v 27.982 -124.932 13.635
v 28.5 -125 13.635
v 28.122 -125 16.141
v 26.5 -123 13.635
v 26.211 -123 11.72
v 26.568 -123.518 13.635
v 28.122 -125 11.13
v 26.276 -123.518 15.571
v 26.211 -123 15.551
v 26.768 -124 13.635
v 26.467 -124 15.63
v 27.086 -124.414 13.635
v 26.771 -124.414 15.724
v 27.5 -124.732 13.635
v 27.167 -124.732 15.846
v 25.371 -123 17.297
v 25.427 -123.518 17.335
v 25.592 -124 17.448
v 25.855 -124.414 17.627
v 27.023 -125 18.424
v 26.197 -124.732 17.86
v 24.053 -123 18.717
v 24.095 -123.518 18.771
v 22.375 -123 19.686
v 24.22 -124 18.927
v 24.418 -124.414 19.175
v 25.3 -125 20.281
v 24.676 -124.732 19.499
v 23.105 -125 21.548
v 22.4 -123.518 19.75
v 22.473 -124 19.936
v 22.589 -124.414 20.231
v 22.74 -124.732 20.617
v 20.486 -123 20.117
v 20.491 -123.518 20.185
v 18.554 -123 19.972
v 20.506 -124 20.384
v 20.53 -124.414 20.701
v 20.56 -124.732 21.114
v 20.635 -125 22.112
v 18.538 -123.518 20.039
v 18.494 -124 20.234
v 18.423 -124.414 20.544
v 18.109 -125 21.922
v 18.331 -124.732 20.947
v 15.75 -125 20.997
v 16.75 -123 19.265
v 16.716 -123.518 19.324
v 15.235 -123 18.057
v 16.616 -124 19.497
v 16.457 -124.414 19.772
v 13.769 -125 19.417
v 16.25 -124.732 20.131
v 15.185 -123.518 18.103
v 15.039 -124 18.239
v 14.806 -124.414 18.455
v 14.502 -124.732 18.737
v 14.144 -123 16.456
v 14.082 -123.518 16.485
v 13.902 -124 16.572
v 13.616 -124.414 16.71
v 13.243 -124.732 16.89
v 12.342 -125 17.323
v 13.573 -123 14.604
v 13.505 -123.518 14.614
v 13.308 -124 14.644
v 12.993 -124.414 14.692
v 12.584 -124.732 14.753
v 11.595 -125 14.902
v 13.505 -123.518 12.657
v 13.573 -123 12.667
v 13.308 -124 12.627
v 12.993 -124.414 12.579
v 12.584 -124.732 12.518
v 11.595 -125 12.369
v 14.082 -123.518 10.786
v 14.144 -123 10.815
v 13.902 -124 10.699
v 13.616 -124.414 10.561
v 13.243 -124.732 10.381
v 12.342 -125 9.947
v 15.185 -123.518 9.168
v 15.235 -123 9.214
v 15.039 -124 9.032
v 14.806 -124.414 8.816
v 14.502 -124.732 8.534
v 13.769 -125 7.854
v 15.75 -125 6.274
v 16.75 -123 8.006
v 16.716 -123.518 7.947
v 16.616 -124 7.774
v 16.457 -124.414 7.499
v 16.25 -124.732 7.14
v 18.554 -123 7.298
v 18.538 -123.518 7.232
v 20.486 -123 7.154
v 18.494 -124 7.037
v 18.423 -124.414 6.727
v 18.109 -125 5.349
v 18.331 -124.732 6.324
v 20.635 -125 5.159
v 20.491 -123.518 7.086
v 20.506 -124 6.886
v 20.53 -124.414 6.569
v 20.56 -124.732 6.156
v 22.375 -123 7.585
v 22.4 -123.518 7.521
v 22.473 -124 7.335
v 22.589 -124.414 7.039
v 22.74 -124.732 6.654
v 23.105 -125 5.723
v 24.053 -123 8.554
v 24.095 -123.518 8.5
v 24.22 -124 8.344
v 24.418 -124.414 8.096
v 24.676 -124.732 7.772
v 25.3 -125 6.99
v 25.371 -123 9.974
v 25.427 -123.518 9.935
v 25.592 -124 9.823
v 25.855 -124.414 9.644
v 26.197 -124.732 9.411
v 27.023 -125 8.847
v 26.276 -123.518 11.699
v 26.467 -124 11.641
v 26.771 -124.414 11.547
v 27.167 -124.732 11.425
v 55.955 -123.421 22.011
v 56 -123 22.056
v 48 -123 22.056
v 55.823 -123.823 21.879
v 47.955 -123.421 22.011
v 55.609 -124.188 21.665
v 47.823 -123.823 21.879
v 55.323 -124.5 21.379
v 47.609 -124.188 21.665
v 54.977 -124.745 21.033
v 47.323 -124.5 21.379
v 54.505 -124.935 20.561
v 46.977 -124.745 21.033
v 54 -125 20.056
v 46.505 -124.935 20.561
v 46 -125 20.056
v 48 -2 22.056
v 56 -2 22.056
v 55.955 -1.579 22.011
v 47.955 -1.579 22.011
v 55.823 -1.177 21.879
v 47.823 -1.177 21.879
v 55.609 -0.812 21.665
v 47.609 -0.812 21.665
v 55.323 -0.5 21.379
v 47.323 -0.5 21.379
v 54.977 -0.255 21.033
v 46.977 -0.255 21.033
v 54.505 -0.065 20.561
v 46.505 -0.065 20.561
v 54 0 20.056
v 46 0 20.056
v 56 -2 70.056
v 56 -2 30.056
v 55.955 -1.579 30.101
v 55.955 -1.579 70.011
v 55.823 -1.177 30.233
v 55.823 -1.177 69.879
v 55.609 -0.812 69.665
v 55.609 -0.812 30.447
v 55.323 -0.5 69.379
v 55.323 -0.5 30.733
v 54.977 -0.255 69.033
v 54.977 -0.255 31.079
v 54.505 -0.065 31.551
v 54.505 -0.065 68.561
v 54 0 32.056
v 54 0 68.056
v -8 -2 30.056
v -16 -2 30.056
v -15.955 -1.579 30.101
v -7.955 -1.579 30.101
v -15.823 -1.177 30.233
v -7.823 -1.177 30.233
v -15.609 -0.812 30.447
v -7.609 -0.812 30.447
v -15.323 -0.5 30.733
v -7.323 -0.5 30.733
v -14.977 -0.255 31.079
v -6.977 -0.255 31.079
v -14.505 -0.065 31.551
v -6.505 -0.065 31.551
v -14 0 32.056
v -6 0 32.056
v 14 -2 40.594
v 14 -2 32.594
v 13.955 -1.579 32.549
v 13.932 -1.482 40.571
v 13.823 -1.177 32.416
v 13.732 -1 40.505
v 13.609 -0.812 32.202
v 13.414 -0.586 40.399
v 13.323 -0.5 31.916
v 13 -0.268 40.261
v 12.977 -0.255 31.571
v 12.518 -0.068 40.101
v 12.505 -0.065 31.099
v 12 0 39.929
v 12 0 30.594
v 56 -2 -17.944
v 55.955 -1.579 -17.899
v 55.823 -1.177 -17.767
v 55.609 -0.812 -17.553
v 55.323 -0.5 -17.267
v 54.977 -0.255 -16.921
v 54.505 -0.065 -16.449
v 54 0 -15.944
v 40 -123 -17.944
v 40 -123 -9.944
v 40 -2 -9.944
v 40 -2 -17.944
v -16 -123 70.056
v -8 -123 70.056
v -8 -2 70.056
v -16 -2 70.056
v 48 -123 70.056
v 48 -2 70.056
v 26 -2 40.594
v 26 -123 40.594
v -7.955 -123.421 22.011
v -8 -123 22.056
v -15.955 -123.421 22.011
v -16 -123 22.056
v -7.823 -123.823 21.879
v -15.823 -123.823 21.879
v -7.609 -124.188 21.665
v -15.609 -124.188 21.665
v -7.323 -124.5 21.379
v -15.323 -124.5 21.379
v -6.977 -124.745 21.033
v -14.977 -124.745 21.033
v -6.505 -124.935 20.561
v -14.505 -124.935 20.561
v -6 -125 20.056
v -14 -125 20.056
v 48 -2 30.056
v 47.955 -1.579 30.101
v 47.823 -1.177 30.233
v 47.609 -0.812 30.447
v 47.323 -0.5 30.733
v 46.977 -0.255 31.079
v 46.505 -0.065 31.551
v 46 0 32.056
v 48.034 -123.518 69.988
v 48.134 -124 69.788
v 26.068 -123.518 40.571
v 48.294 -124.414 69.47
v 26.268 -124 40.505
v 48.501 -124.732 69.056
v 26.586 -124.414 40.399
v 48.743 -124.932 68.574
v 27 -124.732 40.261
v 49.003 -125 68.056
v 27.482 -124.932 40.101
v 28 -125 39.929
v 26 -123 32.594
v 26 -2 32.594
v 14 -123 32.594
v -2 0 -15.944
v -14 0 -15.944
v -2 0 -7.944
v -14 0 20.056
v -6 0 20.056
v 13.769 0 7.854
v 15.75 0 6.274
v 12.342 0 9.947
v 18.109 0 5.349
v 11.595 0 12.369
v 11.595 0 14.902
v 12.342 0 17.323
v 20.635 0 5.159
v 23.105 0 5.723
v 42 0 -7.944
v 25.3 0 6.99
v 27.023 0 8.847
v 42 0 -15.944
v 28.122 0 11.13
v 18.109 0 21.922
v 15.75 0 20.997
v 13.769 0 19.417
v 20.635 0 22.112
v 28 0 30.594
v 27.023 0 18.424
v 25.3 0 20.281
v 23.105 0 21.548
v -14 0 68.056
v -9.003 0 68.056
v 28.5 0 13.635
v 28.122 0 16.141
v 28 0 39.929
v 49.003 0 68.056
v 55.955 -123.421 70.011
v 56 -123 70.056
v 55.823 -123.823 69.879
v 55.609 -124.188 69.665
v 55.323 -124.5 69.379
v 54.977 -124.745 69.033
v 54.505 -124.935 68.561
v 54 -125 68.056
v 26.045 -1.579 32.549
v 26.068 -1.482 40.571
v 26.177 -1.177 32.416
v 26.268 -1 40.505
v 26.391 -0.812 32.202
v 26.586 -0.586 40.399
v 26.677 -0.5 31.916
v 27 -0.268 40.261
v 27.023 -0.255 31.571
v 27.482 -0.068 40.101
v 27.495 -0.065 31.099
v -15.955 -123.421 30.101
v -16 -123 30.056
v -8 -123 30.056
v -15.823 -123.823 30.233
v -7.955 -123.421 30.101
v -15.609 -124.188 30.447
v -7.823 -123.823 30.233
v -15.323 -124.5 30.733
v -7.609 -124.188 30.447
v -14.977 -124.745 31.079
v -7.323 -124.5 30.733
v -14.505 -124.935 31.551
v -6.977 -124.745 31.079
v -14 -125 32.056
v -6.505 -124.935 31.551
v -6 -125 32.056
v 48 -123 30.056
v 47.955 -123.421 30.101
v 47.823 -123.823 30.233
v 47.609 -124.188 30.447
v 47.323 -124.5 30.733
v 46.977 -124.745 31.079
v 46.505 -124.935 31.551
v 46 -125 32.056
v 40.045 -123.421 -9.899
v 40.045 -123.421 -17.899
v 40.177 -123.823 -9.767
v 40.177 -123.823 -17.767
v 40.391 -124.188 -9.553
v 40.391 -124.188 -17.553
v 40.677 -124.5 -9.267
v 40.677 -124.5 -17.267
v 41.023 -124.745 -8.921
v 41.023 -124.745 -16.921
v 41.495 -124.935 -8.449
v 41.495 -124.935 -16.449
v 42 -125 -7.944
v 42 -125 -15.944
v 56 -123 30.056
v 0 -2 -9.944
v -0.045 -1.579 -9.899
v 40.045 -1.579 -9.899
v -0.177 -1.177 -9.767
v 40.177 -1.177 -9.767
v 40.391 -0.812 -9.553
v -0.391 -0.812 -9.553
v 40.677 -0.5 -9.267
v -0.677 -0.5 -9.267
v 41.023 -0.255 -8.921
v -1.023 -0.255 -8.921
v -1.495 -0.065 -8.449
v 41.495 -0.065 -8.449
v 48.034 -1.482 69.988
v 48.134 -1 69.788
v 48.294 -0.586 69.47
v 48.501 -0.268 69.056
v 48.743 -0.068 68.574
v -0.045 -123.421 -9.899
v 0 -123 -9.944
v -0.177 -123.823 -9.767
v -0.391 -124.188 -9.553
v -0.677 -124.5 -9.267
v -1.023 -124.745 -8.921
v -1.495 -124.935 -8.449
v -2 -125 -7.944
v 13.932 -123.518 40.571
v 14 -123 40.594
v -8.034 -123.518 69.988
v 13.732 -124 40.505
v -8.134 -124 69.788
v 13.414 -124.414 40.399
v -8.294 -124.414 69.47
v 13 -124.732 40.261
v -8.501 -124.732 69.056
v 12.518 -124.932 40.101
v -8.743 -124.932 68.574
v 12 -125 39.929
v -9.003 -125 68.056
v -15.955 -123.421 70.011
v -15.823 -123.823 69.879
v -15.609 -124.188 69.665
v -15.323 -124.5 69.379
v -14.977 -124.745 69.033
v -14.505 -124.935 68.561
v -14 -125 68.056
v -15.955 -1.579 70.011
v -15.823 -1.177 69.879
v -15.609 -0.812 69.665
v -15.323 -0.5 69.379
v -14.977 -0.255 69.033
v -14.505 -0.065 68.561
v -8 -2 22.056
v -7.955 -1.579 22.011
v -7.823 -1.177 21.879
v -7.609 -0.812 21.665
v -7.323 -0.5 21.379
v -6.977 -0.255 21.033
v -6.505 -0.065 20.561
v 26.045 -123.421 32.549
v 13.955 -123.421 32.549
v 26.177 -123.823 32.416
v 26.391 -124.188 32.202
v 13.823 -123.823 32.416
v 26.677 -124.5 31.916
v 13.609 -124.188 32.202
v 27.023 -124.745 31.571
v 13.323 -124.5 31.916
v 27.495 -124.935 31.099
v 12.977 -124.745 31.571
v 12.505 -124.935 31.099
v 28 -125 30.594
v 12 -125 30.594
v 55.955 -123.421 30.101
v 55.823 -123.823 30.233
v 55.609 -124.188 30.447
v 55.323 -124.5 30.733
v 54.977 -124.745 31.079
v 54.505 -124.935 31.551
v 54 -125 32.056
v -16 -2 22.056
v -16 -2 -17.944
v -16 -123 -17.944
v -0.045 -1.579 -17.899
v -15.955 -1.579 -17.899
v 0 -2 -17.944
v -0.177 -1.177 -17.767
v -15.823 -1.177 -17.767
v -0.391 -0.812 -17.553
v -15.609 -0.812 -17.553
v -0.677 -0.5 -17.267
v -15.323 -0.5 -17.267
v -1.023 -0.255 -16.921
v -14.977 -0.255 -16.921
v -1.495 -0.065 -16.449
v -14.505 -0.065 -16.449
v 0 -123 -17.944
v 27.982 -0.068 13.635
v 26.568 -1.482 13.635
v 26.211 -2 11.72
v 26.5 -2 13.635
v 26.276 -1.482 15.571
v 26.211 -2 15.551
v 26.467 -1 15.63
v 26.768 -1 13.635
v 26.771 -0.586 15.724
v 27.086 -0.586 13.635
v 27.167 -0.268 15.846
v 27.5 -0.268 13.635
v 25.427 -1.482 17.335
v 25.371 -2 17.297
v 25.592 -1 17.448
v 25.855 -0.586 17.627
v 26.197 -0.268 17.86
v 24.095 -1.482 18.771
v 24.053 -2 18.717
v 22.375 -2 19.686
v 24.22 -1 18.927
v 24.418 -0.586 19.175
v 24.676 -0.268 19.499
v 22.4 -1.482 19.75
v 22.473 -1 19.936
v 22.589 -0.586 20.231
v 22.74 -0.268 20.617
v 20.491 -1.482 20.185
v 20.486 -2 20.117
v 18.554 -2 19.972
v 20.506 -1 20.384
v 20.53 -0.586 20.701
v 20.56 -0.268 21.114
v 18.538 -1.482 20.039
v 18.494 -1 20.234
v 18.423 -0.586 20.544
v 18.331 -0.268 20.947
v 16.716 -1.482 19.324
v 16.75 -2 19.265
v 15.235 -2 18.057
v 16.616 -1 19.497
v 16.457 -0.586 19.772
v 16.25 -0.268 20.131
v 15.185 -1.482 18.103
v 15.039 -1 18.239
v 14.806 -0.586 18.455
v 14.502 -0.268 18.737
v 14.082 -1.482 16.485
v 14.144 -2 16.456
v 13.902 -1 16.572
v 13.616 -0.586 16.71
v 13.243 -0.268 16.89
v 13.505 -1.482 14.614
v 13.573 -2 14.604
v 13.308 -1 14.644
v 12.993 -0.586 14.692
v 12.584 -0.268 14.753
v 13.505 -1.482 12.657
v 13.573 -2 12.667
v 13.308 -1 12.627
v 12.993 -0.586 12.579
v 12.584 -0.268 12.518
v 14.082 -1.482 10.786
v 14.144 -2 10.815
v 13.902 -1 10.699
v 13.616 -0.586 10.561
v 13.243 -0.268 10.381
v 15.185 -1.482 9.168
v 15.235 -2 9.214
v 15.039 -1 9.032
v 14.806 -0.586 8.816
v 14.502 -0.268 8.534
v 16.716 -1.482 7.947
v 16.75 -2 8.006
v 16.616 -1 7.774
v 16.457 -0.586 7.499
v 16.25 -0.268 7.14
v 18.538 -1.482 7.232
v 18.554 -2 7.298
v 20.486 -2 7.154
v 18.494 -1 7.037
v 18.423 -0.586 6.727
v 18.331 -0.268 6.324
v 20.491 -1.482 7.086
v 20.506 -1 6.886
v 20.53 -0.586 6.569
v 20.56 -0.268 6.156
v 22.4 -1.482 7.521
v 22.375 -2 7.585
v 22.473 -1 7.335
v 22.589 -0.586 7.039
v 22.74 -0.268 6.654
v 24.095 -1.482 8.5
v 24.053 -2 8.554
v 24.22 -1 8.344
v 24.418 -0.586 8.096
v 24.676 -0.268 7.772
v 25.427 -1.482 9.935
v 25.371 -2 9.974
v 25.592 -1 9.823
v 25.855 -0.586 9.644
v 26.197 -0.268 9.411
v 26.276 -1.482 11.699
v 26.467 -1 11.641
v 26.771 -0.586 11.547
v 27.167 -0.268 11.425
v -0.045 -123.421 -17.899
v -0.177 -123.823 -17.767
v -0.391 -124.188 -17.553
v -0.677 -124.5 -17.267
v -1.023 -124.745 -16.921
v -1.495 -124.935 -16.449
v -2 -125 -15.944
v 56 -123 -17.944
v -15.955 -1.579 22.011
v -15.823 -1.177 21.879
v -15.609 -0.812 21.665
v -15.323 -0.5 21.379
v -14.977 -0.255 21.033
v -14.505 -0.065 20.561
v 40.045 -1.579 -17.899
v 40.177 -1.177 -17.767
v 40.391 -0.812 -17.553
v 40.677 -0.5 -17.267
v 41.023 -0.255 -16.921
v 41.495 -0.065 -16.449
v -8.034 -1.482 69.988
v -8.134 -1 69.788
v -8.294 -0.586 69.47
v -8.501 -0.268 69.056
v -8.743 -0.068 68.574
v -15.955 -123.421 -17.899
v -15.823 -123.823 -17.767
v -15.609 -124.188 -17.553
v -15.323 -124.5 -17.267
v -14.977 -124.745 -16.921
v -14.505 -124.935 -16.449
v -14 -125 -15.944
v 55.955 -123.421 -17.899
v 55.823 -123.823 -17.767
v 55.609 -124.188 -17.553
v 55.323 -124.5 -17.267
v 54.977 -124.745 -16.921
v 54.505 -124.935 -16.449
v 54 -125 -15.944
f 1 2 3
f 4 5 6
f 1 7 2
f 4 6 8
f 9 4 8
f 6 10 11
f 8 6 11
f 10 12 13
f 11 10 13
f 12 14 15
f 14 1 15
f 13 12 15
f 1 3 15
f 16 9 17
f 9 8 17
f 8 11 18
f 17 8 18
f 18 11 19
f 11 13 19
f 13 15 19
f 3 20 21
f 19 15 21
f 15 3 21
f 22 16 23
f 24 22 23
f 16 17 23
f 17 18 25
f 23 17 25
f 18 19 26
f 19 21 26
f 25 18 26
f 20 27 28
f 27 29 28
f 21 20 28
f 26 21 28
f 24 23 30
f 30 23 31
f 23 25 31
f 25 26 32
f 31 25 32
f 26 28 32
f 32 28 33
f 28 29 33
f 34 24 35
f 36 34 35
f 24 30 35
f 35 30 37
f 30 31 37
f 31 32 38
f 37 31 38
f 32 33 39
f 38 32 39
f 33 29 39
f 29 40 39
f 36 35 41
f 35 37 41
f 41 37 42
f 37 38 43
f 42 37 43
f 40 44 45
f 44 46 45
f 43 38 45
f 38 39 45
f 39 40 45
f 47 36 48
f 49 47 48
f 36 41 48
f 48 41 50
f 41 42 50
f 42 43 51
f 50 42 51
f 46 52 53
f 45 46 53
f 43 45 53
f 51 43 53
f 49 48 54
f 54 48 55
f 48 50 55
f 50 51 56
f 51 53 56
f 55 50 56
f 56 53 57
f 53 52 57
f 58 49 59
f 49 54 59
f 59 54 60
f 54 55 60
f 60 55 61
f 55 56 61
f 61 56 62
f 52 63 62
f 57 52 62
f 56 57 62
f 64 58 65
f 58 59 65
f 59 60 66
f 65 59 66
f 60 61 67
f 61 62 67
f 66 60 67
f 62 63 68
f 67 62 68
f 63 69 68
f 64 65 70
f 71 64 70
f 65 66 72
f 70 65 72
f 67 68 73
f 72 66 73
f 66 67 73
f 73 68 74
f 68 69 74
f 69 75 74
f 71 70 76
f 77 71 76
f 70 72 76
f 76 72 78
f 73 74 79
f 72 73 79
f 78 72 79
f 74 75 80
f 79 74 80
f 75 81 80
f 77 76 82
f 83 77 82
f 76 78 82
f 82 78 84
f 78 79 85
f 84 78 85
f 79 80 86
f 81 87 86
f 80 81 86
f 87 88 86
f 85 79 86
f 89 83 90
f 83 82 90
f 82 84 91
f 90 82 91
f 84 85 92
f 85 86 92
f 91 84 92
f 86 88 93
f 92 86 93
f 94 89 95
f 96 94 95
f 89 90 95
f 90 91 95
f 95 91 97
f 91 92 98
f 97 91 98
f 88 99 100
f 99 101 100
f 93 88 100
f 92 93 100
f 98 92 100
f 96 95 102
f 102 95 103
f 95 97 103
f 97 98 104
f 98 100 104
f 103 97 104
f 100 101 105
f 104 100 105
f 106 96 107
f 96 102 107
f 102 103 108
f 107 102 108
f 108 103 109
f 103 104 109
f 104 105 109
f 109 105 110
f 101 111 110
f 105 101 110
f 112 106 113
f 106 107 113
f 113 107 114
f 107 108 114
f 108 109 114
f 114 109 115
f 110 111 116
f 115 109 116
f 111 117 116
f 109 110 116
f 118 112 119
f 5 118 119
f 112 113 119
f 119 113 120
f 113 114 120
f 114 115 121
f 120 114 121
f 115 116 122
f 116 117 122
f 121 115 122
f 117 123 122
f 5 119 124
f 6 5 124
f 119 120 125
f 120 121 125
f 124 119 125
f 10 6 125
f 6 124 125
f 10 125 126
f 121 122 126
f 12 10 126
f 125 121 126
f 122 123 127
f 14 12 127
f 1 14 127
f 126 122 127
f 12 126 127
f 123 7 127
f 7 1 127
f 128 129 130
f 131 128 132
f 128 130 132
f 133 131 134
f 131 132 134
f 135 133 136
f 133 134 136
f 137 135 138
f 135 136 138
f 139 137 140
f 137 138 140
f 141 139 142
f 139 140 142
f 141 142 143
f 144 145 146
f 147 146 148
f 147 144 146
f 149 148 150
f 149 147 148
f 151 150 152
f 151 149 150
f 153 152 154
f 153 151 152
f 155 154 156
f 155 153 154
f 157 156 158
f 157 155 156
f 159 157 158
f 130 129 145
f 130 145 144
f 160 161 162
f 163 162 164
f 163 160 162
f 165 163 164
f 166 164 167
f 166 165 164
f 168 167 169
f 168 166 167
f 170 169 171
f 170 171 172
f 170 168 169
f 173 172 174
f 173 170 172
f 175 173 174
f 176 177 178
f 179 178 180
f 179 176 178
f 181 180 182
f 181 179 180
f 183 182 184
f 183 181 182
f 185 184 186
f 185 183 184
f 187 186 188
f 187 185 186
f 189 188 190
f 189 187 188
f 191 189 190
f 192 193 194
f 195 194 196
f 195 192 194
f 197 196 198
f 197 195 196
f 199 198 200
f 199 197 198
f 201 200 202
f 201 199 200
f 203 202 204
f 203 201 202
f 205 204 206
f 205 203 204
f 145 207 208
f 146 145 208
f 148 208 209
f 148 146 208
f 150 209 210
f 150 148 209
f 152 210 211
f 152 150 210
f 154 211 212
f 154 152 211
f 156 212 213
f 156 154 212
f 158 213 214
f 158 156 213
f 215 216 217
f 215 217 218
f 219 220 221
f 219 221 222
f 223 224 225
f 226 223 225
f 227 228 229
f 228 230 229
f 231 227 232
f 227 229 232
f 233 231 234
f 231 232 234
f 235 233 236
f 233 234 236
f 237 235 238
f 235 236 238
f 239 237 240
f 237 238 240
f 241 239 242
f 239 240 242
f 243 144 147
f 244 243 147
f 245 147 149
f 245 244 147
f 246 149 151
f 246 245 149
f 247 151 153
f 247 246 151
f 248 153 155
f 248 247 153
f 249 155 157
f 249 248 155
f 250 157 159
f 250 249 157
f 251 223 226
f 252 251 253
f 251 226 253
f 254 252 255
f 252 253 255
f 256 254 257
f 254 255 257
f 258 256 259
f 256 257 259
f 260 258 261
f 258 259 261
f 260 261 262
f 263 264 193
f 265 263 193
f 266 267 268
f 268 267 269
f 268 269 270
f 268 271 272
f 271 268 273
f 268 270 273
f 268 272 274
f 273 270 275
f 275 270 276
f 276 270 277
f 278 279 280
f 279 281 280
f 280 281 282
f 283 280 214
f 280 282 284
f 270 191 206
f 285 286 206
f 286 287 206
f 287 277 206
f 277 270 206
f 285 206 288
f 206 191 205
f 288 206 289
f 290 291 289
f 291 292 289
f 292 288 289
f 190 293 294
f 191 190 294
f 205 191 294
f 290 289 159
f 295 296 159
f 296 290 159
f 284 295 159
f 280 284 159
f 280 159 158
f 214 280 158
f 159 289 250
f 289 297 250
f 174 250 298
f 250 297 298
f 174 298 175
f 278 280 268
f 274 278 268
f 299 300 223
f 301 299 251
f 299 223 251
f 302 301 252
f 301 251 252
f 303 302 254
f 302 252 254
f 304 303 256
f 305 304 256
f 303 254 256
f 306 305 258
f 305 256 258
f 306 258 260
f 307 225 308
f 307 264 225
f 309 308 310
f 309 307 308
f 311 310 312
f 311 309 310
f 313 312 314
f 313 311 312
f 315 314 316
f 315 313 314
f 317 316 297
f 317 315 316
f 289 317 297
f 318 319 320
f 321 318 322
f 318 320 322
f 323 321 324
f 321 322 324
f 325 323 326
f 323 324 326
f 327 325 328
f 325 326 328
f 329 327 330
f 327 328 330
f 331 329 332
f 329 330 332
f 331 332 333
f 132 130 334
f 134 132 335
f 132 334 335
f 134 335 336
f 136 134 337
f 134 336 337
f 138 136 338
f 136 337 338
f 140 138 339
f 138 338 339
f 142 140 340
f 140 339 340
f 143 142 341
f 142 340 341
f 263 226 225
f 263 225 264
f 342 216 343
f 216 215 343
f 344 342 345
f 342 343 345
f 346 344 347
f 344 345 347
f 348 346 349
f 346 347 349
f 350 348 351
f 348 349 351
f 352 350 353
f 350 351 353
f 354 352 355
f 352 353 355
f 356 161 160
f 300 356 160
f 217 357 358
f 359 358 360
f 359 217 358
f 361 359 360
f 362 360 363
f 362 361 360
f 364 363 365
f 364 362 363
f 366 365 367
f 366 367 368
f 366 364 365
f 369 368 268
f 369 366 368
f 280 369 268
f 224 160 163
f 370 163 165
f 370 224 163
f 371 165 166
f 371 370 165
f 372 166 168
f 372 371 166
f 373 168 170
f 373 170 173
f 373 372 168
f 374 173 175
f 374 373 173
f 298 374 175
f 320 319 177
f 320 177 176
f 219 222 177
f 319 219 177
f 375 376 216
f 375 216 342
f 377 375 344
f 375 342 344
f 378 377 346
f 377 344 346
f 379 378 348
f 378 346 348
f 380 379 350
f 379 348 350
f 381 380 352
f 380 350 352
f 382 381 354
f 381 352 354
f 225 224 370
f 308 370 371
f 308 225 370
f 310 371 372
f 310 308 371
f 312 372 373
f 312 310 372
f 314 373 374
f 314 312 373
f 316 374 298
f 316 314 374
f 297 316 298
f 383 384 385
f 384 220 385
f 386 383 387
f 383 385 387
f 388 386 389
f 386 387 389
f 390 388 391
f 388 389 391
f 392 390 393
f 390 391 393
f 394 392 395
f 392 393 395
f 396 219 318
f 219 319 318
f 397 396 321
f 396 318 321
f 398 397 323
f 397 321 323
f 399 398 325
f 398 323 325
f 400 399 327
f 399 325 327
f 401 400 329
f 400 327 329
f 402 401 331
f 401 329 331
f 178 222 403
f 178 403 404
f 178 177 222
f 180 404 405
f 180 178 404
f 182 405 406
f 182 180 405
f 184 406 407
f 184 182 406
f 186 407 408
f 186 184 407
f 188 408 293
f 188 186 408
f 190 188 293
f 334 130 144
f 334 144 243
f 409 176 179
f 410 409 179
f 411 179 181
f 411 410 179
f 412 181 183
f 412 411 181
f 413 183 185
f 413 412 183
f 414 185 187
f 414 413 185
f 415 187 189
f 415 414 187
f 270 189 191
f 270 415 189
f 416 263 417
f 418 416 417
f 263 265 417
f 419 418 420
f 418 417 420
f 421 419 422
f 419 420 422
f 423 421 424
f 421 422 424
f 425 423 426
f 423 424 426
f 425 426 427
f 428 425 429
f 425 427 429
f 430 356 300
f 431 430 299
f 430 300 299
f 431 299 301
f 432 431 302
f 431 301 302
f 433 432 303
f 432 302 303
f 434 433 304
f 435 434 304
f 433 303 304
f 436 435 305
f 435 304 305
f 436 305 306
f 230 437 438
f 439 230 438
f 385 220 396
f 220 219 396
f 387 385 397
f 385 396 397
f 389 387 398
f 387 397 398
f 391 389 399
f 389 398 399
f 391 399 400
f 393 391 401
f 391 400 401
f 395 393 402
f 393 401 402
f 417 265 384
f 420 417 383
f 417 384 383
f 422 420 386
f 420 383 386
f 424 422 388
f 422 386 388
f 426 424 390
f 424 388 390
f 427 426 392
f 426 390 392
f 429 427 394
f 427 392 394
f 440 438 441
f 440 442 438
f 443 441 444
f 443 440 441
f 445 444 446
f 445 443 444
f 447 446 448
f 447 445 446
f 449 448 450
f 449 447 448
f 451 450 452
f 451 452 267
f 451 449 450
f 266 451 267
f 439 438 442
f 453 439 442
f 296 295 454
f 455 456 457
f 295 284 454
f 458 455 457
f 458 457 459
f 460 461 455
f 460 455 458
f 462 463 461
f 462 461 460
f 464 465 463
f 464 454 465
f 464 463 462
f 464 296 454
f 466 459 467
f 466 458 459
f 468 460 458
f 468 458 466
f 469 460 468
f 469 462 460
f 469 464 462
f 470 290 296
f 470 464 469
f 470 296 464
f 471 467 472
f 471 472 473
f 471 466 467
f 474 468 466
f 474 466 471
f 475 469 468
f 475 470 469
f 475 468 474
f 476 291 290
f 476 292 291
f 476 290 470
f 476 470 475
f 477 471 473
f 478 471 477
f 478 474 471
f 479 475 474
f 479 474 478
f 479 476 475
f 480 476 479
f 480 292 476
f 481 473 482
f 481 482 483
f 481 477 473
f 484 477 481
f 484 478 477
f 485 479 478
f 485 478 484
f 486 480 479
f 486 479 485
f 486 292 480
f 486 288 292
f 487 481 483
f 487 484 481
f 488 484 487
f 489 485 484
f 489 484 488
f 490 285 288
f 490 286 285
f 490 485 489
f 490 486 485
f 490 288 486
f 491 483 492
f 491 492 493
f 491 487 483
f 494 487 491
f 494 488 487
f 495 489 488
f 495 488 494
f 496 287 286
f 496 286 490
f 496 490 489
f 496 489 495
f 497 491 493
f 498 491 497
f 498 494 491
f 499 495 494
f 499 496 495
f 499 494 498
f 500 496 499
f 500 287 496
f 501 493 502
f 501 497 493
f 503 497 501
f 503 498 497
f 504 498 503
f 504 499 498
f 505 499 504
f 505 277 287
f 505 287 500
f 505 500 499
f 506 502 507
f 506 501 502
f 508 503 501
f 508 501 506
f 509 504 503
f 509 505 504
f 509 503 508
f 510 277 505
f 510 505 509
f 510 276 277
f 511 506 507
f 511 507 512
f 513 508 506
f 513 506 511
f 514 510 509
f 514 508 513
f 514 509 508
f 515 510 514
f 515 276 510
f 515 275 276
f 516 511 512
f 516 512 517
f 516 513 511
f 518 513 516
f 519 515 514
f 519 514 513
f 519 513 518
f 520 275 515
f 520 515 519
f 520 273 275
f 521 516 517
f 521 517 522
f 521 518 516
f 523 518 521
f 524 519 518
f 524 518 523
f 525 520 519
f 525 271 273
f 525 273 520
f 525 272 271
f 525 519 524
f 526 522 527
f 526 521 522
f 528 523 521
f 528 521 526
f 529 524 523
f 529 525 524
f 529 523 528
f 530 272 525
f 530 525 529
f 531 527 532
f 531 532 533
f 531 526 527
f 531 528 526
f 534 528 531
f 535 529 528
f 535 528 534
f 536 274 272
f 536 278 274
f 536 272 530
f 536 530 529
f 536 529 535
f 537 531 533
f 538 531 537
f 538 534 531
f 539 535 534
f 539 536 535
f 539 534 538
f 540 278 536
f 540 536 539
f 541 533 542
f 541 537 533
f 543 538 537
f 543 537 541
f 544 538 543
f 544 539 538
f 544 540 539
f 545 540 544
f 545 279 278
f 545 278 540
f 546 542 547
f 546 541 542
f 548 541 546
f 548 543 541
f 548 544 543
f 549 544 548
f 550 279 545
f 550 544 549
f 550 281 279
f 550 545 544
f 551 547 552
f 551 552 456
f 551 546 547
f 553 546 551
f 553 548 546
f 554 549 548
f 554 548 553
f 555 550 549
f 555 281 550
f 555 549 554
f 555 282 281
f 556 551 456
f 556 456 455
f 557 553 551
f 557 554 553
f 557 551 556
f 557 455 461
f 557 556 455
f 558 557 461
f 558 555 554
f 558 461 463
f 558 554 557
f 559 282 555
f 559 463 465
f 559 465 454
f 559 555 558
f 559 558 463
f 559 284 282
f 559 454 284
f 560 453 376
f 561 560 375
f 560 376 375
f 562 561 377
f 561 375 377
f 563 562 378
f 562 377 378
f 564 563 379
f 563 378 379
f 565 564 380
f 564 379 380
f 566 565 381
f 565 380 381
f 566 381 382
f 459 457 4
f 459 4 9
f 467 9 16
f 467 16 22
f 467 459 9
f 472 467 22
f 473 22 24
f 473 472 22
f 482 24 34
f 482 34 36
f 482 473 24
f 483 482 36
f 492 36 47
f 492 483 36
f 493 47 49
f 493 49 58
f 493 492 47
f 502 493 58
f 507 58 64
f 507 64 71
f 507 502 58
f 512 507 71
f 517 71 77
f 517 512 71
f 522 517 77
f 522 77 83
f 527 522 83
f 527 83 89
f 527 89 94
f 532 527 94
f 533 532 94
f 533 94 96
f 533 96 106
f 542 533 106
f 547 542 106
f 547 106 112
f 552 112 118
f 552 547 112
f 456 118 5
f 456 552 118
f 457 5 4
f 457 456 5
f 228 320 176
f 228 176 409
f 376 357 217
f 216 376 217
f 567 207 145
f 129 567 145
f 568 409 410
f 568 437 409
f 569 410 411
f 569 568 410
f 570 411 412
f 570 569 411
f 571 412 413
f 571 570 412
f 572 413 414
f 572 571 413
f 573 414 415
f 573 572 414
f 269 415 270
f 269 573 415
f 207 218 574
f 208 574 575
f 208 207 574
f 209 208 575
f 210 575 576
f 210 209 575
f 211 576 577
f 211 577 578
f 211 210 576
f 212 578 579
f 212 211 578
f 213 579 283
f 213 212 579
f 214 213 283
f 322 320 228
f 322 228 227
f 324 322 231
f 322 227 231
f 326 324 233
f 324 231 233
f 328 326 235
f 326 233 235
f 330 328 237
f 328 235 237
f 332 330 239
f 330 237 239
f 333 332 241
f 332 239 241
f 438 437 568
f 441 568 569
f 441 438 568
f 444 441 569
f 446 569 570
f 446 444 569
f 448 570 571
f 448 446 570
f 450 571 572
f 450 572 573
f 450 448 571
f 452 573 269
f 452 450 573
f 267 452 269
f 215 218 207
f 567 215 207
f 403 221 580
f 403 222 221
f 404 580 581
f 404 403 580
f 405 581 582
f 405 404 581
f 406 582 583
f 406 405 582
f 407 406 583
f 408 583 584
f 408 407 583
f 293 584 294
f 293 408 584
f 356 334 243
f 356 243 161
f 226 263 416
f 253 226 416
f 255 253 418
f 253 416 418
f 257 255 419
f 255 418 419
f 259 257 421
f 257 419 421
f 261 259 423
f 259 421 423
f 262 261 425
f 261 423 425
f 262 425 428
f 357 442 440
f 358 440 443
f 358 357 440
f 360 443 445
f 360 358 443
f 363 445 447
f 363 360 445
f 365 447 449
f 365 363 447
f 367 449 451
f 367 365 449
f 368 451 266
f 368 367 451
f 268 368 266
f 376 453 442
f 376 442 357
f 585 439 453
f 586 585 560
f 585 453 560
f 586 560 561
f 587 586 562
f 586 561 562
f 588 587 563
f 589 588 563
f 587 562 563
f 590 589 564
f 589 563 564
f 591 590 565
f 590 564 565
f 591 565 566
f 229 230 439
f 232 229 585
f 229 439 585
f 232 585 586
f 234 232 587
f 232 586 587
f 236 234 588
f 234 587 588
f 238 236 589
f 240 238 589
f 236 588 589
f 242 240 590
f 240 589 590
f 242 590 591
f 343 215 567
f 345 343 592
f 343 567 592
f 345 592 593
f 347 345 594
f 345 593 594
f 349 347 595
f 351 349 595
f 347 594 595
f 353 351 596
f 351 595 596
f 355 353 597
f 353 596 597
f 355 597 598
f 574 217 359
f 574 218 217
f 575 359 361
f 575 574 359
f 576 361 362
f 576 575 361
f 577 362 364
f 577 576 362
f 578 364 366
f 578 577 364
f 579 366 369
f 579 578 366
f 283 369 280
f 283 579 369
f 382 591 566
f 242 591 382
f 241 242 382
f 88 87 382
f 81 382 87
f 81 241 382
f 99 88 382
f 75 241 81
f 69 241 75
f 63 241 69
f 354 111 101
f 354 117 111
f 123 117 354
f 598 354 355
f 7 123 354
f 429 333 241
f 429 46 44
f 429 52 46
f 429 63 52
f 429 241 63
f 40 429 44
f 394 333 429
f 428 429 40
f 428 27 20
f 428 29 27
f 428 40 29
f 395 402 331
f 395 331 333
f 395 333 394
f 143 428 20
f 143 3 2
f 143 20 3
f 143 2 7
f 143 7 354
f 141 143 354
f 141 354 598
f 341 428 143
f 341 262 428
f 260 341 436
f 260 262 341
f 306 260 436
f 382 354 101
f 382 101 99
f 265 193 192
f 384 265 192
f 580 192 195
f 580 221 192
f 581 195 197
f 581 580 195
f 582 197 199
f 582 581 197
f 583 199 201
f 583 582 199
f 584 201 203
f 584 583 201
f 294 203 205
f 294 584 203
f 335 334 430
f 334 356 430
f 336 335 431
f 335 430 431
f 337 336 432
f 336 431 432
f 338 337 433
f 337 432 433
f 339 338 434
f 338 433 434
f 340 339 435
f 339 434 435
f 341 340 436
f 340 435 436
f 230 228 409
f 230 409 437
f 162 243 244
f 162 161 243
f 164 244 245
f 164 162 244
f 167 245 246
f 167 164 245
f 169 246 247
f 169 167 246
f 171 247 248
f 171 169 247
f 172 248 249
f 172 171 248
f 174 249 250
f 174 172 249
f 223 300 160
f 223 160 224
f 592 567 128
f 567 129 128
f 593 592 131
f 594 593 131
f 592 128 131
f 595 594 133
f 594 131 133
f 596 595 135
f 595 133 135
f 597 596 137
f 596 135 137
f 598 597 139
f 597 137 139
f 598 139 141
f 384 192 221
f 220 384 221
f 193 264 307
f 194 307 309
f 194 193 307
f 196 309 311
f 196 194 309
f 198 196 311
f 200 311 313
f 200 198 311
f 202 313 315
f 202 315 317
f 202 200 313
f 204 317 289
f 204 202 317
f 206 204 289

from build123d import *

# Parameters (mm, degrees)
F0_R     = 6.5
F1_DEPTH = 125
F2_R     = 2


with BuildPart() as f1:
    # F0 (on Front) → F1 (new body)
    with BuildSketch(Plane.XZ):
        Polygon((-16, 22.055958), (-16, -17.944042), (0, -17.944042), (0, -9.944042), (40, -9.944042), (40, -17.944042), (56, -17.944042), (56, 22.055958), (48, 22.055958), (48, 30.055958), (56, 30.055958), (56, 70.055958), (48, 70.055958), (26, 40.59356), (26, 32.59356), (20, 32.59356), (14, 32.59356), (14, 40.59356), (-8, 70.055958), (-16, 70.055958), (-16, 30.055958), (-8, 30.055958), (-8, 22.055958), align=None)
        with Locations((20, 13.635462)):
            Circle(F0_R, mode=Mode.SUBTRACT)
    extrude(amount=F1_DEPTH)

    # F2
    f2_edges = [f1.edges().sort_by_distance(p)[0] for p in [
        (-16, -125, 50.055958),
        (-12, -125, 70.055958),
        (3, -125, 55.324759),
        (-12, -125, 30.055958),
        (-8, -125, 26.055958),
        (-12, -125, 22.055958),
        (-16, -125, 2.055958),
        (-8, -125, -17.944042),
        (0, -125, -13.944042),
        (20, -125, -9.944042),
        (40, -125, -13.944042),
        (48, -125, -17.944042),
        (56, -125, 2.055958),
        (52, -125, 22.055958),
        (48, -125, 26.055958),
        (52, -125, 30.055958),
        (56, -125, 50.055958),
        (52, -125, 70.055958),
        (37, -125, 55.324759),
        (26, -125, 36.59356),
        (20, -125, 32.59356),
        (14, -125, 36.59356),
        (13.5, -125, 13.635462),
        (-16, 0, 50.055958),
        (-12, 0, 30.055958),
        (-8, 0, 26.055958),
        (-12, 0, 22.055958),
        (-16, 0, 2.055958),
        (-8, 0, -17.944042),
        (0, 0, -13.944042),
        (20, 0, -9.944042),
        (40, 0, -13.944042),
        (48, 0, -17.944042),
        (56, 0, 2.055958),
        (52, 0, 22.055958),
        (48, 0, 26.055958),
        (52, 0, 30.055958),
        (56, 0, 50.055958),
        (52, 0, 70.055958),
        (37, 0, 55.324759),
        (26, 0, 36.59356),
        (20, 0, 32.59356),
        (14, 0, 36.59356),
        (3, 0, 55.324759),
        (-12, 0, 70.055958),
        (13.5, 0, 13.635462),
    ]]
    fillet(f2_edges, radius=F2_R)


solid = f1.part
